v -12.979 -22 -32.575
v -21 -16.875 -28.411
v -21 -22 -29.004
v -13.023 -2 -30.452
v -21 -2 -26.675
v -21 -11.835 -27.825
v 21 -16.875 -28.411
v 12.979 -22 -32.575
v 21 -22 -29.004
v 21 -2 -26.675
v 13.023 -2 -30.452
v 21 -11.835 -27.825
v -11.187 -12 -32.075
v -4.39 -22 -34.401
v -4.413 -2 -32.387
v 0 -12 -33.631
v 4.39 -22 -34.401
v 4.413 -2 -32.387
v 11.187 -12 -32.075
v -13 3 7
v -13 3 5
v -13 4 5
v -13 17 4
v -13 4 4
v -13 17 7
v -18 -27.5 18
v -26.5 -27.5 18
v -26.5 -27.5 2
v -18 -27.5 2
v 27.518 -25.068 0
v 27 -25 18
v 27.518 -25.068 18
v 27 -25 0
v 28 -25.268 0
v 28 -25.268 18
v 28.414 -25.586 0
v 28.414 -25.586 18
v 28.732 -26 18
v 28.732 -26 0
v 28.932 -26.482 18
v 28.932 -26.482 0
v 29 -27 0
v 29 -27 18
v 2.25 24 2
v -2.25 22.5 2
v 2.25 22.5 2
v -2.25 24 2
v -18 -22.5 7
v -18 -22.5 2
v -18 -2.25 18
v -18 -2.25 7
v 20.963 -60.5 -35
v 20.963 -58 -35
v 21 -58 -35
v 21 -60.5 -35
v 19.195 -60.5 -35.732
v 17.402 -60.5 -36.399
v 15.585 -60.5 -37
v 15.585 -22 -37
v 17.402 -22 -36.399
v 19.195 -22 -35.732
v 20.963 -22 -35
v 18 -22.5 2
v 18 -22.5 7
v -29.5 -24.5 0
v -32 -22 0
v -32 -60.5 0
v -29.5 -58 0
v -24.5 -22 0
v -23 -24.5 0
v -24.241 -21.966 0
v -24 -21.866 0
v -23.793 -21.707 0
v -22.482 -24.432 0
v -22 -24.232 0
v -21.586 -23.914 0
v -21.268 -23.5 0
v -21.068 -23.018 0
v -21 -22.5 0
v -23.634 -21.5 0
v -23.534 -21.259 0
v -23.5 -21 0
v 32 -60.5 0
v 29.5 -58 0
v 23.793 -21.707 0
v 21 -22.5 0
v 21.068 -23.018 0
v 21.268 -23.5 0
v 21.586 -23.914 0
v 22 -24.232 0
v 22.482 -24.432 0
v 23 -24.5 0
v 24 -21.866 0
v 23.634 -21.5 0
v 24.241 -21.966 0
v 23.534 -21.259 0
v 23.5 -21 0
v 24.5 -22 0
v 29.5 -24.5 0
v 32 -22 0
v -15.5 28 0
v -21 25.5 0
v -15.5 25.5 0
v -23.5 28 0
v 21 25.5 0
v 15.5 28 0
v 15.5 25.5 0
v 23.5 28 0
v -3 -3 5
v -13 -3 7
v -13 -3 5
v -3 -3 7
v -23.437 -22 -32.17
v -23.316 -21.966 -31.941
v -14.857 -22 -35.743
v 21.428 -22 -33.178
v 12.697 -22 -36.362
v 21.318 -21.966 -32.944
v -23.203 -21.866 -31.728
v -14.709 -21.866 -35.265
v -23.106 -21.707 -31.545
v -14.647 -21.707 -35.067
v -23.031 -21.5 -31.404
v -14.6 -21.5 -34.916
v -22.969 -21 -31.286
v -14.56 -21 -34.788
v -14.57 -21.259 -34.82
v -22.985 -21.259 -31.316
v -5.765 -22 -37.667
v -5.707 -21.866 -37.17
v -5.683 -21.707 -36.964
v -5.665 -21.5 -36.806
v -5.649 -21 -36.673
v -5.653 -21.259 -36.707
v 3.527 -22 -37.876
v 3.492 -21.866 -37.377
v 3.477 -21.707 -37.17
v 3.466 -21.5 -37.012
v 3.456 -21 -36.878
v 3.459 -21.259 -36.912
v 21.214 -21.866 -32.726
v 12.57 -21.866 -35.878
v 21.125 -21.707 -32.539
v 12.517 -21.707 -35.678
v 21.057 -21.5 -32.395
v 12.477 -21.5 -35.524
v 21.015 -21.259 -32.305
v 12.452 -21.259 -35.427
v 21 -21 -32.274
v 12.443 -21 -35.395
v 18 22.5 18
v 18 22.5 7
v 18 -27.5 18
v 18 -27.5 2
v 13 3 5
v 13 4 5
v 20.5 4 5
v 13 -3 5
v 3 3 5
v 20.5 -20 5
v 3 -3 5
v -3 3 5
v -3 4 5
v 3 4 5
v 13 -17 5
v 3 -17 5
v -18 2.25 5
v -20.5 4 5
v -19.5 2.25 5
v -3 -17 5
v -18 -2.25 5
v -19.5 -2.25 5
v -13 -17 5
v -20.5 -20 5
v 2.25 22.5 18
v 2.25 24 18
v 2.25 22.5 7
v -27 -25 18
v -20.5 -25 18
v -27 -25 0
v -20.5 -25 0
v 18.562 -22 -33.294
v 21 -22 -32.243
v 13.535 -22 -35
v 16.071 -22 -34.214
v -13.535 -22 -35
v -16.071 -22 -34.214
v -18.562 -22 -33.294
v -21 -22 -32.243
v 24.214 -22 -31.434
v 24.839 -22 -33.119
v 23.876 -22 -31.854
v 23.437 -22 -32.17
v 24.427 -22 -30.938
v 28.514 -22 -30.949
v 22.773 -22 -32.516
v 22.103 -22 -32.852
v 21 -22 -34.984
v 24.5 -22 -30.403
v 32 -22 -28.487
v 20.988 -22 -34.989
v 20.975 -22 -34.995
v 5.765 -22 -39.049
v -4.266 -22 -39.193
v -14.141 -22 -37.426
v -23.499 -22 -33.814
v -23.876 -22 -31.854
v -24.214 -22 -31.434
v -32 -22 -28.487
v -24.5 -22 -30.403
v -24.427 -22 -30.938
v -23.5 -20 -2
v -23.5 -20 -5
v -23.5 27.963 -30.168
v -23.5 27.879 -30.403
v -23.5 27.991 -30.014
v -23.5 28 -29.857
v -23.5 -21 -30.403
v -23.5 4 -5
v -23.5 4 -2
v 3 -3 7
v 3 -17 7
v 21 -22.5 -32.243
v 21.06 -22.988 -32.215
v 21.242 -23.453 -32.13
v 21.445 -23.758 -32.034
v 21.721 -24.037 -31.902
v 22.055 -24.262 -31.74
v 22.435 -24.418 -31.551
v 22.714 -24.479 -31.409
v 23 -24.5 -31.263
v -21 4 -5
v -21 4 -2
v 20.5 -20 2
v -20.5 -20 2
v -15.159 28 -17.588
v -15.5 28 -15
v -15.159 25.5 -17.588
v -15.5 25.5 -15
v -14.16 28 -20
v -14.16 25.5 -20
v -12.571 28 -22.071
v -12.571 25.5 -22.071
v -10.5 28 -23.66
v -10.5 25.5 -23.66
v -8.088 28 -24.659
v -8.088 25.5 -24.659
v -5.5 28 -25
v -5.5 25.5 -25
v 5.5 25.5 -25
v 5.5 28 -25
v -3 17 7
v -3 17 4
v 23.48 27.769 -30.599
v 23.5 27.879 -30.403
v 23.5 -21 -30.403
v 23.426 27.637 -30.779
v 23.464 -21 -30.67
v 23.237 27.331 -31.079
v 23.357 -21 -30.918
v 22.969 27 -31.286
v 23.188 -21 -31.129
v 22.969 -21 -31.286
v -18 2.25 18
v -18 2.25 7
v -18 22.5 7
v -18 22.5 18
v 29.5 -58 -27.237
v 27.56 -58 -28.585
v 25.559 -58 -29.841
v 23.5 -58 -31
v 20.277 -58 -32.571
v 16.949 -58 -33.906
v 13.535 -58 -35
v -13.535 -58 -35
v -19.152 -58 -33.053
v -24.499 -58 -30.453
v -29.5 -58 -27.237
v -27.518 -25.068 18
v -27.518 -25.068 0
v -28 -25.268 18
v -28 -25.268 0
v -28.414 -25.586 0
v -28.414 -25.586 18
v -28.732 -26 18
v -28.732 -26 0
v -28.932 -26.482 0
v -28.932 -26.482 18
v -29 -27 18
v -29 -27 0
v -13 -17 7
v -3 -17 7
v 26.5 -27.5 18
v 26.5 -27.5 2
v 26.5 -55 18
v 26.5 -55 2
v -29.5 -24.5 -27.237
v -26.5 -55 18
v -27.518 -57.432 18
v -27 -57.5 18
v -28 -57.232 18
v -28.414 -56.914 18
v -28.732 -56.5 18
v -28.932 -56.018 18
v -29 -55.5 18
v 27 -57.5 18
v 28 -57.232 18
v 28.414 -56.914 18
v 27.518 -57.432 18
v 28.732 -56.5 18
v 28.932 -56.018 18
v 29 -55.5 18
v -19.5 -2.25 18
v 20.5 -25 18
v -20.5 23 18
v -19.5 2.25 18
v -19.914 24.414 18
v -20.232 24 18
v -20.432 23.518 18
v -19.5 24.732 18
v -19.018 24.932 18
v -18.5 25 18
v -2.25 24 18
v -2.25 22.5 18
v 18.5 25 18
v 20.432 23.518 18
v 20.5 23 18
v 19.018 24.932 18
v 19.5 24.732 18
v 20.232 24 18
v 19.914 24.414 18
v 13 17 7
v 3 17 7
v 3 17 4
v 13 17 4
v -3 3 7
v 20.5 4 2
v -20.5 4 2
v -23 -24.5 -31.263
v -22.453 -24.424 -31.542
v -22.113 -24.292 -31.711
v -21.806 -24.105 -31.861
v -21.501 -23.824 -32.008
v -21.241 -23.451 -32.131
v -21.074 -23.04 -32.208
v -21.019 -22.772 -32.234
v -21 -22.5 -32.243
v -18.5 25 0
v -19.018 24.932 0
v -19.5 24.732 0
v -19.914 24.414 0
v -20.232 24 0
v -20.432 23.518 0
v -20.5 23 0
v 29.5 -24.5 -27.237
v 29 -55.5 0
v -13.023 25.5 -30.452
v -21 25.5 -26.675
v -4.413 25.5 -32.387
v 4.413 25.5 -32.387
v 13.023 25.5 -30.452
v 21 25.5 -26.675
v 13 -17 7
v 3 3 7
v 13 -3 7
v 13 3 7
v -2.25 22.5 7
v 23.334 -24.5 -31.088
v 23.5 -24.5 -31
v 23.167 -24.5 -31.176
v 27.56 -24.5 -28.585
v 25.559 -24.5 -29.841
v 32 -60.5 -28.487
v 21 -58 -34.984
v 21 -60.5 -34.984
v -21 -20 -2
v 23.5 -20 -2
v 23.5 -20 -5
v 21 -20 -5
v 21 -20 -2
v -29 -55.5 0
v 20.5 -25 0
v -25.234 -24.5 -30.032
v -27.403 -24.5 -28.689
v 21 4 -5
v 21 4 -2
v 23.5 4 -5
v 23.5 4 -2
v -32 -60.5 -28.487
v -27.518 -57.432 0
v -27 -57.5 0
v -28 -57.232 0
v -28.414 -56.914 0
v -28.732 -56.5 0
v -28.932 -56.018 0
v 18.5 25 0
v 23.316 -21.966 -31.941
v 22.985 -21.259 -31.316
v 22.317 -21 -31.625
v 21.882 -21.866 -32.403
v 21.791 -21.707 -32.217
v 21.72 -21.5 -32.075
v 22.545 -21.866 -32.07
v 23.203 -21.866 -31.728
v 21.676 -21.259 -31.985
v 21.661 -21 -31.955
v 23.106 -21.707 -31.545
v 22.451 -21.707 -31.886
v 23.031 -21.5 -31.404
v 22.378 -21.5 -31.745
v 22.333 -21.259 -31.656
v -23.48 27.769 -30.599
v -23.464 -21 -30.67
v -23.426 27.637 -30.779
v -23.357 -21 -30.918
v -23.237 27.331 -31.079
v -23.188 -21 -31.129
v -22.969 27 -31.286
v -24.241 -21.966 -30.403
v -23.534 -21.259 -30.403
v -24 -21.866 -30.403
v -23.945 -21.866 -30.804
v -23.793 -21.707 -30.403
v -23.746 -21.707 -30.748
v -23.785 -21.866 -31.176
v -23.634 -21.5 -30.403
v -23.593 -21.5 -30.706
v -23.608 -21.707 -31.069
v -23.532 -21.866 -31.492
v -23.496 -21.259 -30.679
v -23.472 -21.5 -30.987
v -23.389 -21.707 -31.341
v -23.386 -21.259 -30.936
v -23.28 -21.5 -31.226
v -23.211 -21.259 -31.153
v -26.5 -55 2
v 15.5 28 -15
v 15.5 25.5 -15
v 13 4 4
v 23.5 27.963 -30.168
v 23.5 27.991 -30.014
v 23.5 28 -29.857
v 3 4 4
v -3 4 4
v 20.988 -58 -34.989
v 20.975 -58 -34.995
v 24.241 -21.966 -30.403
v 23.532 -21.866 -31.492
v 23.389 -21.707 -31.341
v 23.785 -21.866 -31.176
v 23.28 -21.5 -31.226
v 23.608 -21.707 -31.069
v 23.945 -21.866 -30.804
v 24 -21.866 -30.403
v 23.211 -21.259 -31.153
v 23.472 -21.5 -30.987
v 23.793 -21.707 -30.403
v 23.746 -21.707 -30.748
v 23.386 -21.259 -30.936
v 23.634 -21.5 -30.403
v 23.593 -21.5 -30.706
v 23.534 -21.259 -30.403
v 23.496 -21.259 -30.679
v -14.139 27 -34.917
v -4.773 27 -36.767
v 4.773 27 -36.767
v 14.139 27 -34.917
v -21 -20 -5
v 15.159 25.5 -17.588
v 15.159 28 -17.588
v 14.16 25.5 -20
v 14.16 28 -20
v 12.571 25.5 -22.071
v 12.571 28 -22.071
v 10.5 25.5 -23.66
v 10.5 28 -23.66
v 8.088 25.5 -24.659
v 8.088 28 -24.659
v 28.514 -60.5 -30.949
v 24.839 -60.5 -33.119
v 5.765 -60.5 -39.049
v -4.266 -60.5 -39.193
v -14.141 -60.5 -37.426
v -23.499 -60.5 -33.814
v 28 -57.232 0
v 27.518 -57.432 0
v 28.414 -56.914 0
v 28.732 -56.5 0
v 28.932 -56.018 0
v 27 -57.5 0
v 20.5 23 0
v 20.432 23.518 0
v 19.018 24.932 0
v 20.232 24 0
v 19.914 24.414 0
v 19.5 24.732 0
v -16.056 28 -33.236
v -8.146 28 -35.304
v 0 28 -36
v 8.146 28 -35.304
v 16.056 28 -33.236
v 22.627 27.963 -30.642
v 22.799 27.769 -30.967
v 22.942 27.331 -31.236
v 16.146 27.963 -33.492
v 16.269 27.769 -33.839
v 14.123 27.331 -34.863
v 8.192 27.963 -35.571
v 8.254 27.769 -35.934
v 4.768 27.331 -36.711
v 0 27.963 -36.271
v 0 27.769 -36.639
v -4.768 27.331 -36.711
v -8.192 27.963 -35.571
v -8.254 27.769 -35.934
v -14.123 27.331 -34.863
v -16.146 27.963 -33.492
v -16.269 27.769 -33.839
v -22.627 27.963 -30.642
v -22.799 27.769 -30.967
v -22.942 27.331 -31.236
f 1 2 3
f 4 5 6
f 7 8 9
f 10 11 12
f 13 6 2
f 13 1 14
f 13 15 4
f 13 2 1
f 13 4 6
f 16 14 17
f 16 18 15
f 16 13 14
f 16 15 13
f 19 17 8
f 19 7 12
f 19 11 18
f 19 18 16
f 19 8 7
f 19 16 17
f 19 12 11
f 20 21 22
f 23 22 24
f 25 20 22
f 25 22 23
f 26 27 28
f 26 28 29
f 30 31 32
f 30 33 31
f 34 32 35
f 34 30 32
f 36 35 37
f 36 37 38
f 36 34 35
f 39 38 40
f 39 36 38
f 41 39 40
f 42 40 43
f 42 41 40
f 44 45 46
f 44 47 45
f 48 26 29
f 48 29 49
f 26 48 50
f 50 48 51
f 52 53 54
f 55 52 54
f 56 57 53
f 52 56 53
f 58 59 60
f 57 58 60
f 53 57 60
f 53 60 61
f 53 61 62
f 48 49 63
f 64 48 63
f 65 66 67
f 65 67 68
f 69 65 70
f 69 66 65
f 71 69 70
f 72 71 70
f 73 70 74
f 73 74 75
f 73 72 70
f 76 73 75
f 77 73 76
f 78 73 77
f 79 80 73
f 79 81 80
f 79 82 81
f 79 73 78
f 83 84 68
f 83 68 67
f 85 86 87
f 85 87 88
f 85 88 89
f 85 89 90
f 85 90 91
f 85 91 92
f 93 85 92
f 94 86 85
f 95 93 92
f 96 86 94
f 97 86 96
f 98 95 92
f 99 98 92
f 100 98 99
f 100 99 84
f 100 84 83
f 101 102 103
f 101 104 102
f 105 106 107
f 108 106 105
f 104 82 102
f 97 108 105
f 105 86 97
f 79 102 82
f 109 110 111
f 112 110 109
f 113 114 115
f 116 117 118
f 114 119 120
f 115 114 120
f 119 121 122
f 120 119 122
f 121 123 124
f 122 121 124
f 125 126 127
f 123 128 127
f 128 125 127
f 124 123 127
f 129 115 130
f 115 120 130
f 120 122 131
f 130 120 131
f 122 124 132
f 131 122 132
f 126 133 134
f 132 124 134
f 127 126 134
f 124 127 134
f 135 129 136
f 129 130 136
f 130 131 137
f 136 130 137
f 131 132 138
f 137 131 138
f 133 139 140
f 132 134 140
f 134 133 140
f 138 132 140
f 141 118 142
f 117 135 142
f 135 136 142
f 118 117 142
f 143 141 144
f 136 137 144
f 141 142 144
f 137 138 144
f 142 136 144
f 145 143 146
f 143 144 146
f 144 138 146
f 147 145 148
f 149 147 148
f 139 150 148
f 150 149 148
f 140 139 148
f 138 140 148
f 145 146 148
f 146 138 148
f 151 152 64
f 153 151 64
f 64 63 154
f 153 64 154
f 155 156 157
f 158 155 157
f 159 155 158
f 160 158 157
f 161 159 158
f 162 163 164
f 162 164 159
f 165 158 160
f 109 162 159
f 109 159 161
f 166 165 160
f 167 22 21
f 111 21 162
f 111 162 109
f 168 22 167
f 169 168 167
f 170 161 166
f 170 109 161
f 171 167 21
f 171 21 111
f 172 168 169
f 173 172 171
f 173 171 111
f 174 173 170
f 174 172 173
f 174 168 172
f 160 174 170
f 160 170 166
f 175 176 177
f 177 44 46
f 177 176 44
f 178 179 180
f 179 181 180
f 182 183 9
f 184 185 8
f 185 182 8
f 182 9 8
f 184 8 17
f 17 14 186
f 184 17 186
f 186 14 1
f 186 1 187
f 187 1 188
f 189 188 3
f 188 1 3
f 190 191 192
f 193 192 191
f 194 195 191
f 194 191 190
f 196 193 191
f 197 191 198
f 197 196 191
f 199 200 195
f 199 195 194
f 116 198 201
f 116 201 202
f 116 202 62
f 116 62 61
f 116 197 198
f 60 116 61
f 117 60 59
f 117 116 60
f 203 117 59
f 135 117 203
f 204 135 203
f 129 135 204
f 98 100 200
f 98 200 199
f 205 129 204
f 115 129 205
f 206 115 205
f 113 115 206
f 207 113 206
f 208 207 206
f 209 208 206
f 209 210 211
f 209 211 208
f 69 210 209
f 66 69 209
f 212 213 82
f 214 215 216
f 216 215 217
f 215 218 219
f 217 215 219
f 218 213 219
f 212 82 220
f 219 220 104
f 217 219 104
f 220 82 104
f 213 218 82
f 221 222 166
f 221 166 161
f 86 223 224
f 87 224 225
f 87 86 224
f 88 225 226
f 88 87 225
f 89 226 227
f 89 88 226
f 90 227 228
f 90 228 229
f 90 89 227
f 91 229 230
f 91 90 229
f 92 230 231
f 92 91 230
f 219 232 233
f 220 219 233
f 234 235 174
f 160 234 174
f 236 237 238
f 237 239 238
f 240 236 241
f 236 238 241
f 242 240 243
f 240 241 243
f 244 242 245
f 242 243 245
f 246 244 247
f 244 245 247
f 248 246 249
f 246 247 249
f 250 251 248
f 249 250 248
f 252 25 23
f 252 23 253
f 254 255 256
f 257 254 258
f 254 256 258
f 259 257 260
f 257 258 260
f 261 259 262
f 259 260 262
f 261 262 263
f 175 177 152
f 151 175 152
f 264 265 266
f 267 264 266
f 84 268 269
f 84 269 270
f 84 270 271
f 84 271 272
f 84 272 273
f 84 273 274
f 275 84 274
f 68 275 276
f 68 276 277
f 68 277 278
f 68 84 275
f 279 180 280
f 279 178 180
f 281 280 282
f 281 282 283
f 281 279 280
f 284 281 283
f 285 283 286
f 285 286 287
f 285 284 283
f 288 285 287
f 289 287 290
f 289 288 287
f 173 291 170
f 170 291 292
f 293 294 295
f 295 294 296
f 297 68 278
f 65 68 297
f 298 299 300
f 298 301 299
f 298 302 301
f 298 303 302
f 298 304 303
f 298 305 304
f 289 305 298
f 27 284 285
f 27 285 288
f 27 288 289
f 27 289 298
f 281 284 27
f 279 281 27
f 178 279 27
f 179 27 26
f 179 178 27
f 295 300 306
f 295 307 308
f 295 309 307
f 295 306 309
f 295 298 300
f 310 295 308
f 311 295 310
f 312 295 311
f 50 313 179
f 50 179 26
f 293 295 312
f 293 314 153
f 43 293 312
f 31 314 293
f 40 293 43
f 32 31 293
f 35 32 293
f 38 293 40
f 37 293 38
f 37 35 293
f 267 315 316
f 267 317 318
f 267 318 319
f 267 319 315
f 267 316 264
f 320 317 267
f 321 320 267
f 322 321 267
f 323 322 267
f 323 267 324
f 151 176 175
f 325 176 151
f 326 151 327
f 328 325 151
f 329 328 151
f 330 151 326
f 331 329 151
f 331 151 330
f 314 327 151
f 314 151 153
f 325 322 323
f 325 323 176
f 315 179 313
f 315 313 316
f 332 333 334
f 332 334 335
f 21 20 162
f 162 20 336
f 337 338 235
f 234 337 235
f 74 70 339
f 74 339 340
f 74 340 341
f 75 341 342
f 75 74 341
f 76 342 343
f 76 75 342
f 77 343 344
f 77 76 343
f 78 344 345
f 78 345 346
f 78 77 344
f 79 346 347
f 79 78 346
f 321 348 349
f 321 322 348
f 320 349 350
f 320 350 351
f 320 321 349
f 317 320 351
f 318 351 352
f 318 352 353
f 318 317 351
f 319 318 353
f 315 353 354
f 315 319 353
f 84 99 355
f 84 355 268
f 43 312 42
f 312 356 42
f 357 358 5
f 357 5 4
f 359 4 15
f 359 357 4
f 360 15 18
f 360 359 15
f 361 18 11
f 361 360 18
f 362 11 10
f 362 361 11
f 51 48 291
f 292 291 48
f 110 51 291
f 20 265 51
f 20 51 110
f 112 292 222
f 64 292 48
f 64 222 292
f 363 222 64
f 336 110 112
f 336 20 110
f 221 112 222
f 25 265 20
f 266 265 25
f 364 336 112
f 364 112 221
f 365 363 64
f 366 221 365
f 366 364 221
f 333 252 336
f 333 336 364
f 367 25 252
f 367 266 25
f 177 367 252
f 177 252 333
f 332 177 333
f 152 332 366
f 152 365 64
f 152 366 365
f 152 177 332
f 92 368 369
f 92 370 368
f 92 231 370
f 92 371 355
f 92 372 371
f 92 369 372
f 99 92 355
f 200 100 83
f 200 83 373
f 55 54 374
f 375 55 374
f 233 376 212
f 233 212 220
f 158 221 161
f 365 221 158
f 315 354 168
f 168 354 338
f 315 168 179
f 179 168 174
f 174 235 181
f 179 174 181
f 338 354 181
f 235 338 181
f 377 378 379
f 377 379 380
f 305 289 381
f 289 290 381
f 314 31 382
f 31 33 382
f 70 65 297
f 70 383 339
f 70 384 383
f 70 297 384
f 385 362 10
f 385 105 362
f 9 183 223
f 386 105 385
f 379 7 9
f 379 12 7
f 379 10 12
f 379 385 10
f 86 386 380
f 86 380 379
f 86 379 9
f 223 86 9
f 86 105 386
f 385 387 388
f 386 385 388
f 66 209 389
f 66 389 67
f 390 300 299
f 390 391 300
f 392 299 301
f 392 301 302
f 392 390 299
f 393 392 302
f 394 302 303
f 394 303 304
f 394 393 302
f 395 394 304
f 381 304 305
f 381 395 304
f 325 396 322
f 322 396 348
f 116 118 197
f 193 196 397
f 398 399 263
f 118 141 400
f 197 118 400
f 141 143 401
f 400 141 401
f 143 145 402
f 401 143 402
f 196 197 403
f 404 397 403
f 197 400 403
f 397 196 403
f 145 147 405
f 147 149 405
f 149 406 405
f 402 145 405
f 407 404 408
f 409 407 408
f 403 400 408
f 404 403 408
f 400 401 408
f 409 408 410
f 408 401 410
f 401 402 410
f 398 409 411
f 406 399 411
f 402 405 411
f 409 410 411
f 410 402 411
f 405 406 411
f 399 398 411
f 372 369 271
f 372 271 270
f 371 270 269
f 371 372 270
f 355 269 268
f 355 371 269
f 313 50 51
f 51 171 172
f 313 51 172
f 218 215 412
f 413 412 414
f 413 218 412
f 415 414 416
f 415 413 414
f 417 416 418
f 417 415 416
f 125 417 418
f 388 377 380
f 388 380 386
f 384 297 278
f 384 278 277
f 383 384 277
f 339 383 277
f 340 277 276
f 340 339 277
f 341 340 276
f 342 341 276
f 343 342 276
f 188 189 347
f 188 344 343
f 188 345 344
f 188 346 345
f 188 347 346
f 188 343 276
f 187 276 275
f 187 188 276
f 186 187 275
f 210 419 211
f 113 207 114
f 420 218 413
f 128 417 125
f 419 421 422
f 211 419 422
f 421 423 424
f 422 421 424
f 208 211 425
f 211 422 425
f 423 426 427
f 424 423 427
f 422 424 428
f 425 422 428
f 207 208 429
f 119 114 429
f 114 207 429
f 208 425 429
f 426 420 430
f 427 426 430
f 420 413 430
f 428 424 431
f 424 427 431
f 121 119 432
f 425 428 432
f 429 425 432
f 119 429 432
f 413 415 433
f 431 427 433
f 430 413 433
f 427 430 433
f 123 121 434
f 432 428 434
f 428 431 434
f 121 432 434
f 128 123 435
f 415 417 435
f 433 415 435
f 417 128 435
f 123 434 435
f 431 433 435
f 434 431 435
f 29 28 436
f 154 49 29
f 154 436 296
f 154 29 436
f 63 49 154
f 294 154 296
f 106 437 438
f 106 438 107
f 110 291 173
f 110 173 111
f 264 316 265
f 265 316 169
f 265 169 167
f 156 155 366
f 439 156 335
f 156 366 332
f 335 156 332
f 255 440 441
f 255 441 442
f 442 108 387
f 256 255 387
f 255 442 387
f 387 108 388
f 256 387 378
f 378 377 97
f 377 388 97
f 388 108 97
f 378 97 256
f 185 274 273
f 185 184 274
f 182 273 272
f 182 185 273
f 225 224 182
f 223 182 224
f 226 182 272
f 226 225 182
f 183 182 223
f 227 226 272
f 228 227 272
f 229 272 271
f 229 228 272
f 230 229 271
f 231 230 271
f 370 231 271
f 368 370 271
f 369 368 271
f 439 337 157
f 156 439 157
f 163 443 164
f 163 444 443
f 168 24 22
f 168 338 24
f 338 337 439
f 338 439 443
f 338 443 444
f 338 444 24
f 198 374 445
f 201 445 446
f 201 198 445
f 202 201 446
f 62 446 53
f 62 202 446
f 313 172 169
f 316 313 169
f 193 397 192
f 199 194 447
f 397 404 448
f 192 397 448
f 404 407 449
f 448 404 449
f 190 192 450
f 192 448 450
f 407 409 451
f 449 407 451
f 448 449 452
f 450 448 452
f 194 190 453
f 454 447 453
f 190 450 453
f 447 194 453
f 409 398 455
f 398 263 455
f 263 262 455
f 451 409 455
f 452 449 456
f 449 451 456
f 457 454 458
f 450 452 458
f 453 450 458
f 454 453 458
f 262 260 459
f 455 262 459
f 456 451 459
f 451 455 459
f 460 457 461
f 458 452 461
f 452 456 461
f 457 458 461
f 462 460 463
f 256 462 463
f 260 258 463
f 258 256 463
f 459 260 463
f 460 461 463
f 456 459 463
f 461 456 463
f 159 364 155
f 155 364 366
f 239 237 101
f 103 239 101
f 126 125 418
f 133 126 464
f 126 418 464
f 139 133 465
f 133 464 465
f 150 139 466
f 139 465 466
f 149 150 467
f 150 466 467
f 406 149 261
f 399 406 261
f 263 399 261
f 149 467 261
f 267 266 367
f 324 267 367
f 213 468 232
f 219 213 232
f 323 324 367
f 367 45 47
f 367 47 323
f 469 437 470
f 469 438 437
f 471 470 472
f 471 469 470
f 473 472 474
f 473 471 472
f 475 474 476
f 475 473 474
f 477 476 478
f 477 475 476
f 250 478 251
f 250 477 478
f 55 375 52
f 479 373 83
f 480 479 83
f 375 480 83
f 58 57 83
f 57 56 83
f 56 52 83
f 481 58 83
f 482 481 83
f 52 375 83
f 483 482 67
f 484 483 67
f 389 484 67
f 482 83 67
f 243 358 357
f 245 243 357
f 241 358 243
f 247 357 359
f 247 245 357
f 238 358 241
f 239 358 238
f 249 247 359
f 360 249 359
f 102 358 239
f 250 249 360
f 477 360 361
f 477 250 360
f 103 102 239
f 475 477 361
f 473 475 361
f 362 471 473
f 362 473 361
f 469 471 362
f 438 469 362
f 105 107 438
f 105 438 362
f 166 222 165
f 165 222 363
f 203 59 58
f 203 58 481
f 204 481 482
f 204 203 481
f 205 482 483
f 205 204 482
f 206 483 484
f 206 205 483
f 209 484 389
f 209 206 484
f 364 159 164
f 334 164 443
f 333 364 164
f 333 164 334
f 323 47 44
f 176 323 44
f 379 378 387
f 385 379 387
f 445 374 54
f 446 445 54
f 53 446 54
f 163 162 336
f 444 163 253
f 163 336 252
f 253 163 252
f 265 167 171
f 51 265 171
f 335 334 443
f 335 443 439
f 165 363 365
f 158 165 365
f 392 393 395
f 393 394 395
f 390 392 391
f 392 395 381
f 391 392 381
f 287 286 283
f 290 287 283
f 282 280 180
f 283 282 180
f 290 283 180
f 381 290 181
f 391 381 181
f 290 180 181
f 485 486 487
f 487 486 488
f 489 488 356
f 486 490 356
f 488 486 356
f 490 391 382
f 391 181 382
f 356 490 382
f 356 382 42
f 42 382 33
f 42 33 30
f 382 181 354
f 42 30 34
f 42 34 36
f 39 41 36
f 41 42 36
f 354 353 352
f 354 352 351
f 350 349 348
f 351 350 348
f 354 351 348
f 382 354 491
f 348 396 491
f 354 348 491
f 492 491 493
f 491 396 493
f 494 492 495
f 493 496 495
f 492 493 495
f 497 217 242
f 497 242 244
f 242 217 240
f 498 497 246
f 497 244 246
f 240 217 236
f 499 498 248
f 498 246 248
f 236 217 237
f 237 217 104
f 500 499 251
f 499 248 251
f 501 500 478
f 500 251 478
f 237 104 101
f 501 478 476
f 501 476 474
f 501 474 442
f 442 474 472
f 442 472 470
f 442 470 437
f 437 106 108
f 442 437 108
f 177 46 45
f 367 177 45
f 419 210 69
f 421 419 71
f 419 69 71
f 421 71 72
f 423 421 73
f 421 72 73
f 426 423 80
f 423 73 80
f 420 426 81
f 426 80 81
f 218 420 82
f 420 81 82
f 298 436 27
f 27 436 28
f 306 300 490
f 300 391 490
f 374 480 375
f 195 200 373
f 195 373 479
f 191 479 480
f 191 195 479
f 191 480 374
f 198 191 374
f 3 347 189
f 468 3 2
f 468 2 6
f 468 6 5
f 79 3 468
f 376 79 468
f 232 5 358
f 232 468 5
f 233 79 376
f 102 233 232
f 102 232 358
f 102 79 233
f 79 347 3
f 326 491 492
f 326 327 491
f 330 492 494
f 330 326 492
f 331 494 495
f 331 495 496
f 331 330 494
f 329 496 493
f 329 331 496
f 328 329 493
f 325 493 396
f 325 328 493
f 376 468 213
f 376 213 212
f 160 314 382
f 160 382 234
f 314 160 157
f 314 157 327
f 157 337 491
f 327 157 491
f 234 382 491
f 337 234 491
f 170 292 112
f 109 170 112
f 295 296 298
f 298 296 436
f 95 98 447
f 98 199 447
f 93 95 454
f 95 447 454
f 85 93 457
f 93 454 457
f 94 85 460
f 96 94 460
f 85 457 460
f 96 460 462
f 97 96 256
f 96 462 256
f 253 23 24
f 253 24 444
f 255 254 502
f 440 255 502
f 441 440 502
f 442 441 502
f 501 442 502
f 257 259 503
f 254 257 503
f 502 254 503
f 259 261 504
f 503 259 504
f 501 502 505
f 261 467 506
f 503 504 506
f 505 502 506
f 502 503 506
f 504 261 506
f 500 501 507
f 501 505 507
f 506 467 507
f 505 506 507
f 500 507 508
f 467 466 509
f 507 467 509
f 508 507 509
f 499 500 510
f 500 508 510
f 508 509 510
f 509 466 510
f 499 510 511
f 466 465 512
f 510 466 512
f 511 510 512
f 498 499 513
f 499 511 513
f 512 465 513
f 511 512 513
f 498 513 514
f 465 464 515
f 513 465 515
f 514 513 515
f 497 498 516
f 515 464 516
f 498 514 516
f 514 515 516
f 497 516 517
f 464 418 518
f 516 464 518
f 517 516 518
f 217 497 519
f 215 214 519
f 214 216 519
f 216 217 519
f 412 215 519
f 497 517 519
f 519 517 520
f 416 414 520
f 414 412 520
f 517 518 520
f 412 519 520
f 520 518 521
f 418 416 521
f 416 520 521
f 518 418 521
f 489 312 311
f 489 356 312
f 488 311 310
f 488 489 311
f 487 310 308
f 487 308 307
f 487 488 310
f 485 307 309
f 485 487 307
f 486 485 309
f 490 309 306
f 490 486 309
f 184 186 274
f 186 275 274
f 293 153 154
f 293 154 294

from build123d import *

# Parameters (mm, degrees)
F1_DEPTH  = 2
F2_DEPTH  = 18
F4_DEPTH  = 5
F5_W      = 24
F5_H      = 3
F6_DEPTH  = 41
F7_W      = 10
F7_H      = 14
F8_DEPTH  = 3
F9_DEPTH  = 35
F11_DEPTH = 2
F12_R     = 2
F13_W     = 31
F13_H     = 25
F14_DEPTH = 2.5
F15_R     = 10
F17_DEPTH = 50
F18_DEPTH = 50
F20_DEPTH = 38.5
F21_DEPTH = 38.5
F22_R     = 1
F23_W     = 24
F23_H     = 3
F24_DEPTH = 47
F25_SIZE2 = 20
F25_SIZE  = 2


with BuildPart() as f1:
    # F0 (on Top) → F1 (new body)
    with BuildSketch(Plane.XY):
        Polygon((20.5, -25), (20.5, 25), (-20.5, 25), (-20.5, -25), (-29, -25), (-29, -57.5), (29, -57.5), (29, -25), align=None)
        Polygon((2.25, 22.5), (18, 22.5), (18, -27.5), (26.5, -27.5), (26.5, -55), (-26.5, -55), (-26.5, -27.5), (-18, -27.5), (-18, -2.25), (-19.5, -2.25), (-19.5, 2.25), (-18, 2.25), (-18, 22.5), (-2.25, 22.5), (-2.25, 24), (2.25, 24), align=None, mode=Mode.SUBTRACT)
        Polygon((18, -27.5), (18, 22.5), (2.25, 22.5), (2.25, 24), (-2.25, 24), (-2.25, 22.5), (-18, 22.5), (-18, 2.25), (-19.5, 2.25), (-19.5, -2.25), (-18, -2.25), (-18, -27.5), (-26.5, -27.5), (-26.5, -55), (26.5, -55), (26.5, -27.5), align=None)
    extrude(amount=F1_DEPTH)

    # F0 (on Top) → F2 (join)
    with BuildSketch(Plane.XY):
        Polygon((20.5, -25), (20.5, 25), (-20.5, 25), (-20.5, -25), (-29, -25), (-29, -57.5), (29, -57.5), (29, -25), align=None)
        Polygon((2.25, 22.5), (18, 22.5), (18, -27.5), (26.5, -27.5), (26.5, -55), (-26.5, -55), (-26.5, -27.5), (-18, -27.5), (-18, -2.25), (-19.5, -2.25), (-19.5, 2.25), (-18, 2.25), (-18, 22.5), (-2.25, 22.5), (-2.25, 24), (2.25, 24), align=None, mode=Mode.SUBTRACT)
    extrude(amount=F2_DEPTH)

    # F3 (on face) → F4 (join)
    with BuildSketch(Plane.XY.offset(2)):
        Polygon((18, -22.5), (18, 22.5), (2.25, 22.5), (-2.25, 22.5), (-18, 22.5), (-18, 2.25), (-18, -2.25), (-18, -22.5), align=None)
    extrude(amount=F4_DEPTH)

    # F5 (on face) → F6 (cut, through all)
    with BuildSketch(Plane(origin=(-20.5, 0, 0), x_dir=(0, -1, 0), z_dir=(-1, 0, 0))):
        with Locations((8, 3.5)):
            Rectangle(F5_W, F5_H)
    extrude(amount=-F6_DEPTH, mode=Mode.SUBTRACT)

    # F7 (on face) → F8 (cut)
    with BuildSketch(Plane.XY.offset(7)):
        with Locations((-8, 10)):
            Rectangle(F7_W, F7_H)
        with Locations((8, 10)):
            Rectangle(F7_W, F7_H)
        with Locations((-8, -10)):
            Rectangle(F7_W, F7_H)
        with Locations((8, -10)):
            Rectangle(F7_W, F7_H)
    extrude(amount=-F8_DEPTH, mode=Mode.SUBTRACT)

    # F12
    f12_edges = [f1.edges().sort_by_distance(p)[0] for p in [
        (-29, -57.5, 9),
        (-29, -25, 9),
        (29, -57.5, 9),
        (-20.5, 25, 9),
        (29, -25, 9),
        (20.5, 25, 9),
    ]]
    fillet(f12_edges, radius=F12_R)


with BuildPart() as f9:
    # F0 (on Top) → F9 (new body)
    with BuildSketch(Plane.XY):
        Polygon((-23.5, -22), (-32, -22), (-32, -60.5), (32, -60.5), (32, -22), (23.5, -22), (23.5, 28), (-23.5, 28), align=None)
        with BuildLine():
            Line((-29.5, -58), (-29.5, -24.5))
            Line((-29.5, -24.5), (-23, -24.5))
            ThreePointArc((-23, -24.5), (-21.5857864376, -23.9142135624), (-21, -22.5))
            Line((-21, -22.5), (-21, 25.5))
            Line((-21, 25.5), (21, 25.5))
            Line((21, 25.5), (21, -22.5))
            ThreePointArc((21, -22.5), (21.5857864376, -23.9142135624), (23, -24.5))
            Line((23, -24.5), (29.5, -24.5))
            Line((29.5, -24.5), (29.5, -58))
            Line((29.5, -58), (-29.5, -58))
        make_face(mode=Mode.SUBTRACT)
    extrude(amount=-F9_DEPTH)

    # F10 (on face) → F11 (join)
    with BuildSketch(Plane(origin=(0, 0, -35), x_dir=(1, 0, 0), z_dir=(0, 0, -1))):
        Polygon((32, 60.5), (-32, 60.5), (-32, 22), (-23.5, 22), (-23.5, -28), (23.5, -28), (23.5, 22), (32, 22), align=None)
    extrude(amount=F11_DEPTH)

    # F13 (on face) → F14 (cut, through all)
    with BuildSketch(Plane(origin=(0, 28, 0), x_dir=(-1, 0, 0), z_dir=(0, 1, 0))):
        with Locations((0, -12.5)):
            Rectangle(F13_W, F13_H)
    extrude(amount=-F14_DEPTH, mode=Mode.SUBTRACT)

    # F15
    f15_edges = [f9.edges().sort_by_distance(p)[0] for p in [
        (15.5, 26.75, -25),
        (-15.5, 26.75, -25),
    ]]
    fillet(f15_edges, radius=F15_R)

    # F16 (on face) → F17 (cut, through all)
    with BuildSketch(Plane(origin=(0, 28, 0), x_dir=(-1, 0, 0), z_dir=(0, 1, 0))):
        with BuildLine():
            Line((23.5, -37), (1.547e-07, -37))
            Line((1.547e-07, -37), (-23.5, -37))
            Line((-23.5, -37), (-23.5, -37.7059200294))
            ThreePointArc((-23.5, -37.7059200294), (0, -42.9791666667), (23.5, -37.7059200294))
            Line((23.5, -37.7059200294), (23.5, -37))
        make_face()
        with BuildLine():
            ThreePointArc((1.547e-07, -37), (-12.1269327607, -35.476320292), (-23.5, -31))
            Line((-23.5, -31), (-23.5, -37))
            Line((-23.5, -37), (1.547e-07, -37))
        make_face()
        with BuildLine():
            Line((23.5, -37), (23.5, -31))
            ThreePointArc((23.5, -31), (12.1269329106, -35.4763202538), (1.547e-07, -37))
            Line((1.547e-07, -37), (23.5, -37))
        make_face()
    extrude(amount=-F17_DEPTH, mode=Mode.SUBTRACT)

    # F16 (on face) → F18 (join, through all)
    with BuildSketch(Plane(origin=(0, 28, 0), x_dir=(-1, 0, 0), z_dir=(0, 1, 0))):
        with BuildLine():
            ThreePointArc((23.5, -25), (0, -32.6310333807), (-23.5, -25))
            Line((-23.5, -25), (-23.5, -31))
            ThreePointArc((-23.5, -31), (-12.1269327607, -35.476320292), (1.547e-07, -37))
            ThreePointArc((1.547e-07, -37), (12.1269329106, -35.4763202538), (23.5, -31))
            Line((23.5, -31), (23.5, -25))
        make_face()
    extrude(amount=-F18_DEPTH)

    # F19 (on face) → F20 (cut, through all)
    with BuildSketch(Plane(origin=(0, -22, 0), x_dir=(-1, 0, 0), z_dir=(0, 1, 0))):
        with BuildLine():
            ThreePointArc((-21, -34.9837240518), (-26.6983501126, -32.0711934239), (-32, -28.4869867981))
            Line((-32, -28.4869867981), (-32, -37))
            Line((-32, -37), (-15.5852542827, -37))
            ThreePointArc((-15.5852542827, -37), (-18.3013018384, -36.073511616), (-20.962667627, -35))
            Line((-20.962667627, -35), (-21, -35))
            Line((-21, -35), (-21, -34.9837240518))
        make_face()
        with BuildLine():
            Line((-15.5852542827, -37), (-32, -37))
            Line((-32, -37), (-32, -37.6209894166))
            ThreePointArc((-32, -37.6209894166), (0, -46.8666792548), (32, -37.6209894166))
            Line((32, -37.6209894166), (32, -28.4869867981))
            ThreePointArc((32, -28.4869867981), (9.2454755251, -38.5461837253), (-15.5852542827, -37))
        make_face()
        with BuildLine():
            ThreePointArc((-23.5, -31), (-27.8967129385, -28.3609367759), (-32, -25.2854246794))
            Line((-32, -25.2854246794), (-32, -28.4869867981))
            ThreePointArc((-32, -28.4869867981), (-26.6983501126, -32.0711934239), (-21, -34.9837240518))
            Line((-21, -34.9837240518), (-21, -32.2741110813))
            ThreePointArc((-21, -32.2741110813), (-22.2591181263, -31.6549466933), (-23.5, -31))
        make_face()
        with BuildLine():
            ThreePointArc((32, -25.2854246794), (5.1211905621, -36.6037218611), (-23.5, -31))
            ThreePointArc((-23.5, -31), (-22.2591181263, -31.6549466933), (-21, -32.2741110813))
            Line((-21, -32.2741110813), (-21, -34.9837240518))
            ThreePointArc((-21, -34.9837240518), (-20.9813353917, -34.9918656459), (-20.962667627, -35))
            Line((-20.962667627, -35), (-13.859413167, -35))
            ThreePointArc((-13.859413167, -35), (-7.0014879371, -36.4974237186), (0, -37))
            Line((0, -37), (-15.5852542827, -37))
            ThreePointArc((-15.5852542827, -37), (9.2454755251, -38.5461837253), (32, -28.4869867981))
            Line((32, -28.4869867981), (32, -25.2854246794))
        make_face()
    extrude(amount=-F20_DEPTH, mode=Mode.SUBTRACT)

    # F19 (on face) → F21 (join, through all)
    with BuildSketch(Plane(origin=(0, -22, 0), x_dir=(-1, 0, 0), z_dir=(0, 1, 0))):
        with BuildLine():
            ThreePointArc((-23.5, -31), (-27.8967129385, -28.3609367759), (-32, -25.2854246794))
            Line((-32, -25.2854246794), (-32, -28.4869867981))
            ThreePointArc((-32, -28.4869867981), (-26.6983501126, -32.0711934239), (-21, -34.9837240518))
            Line((-21, -34.9837240518), (-21, -32.2741110813))
            ThreePointArc((-21, -32.2741110813), (-22.2591181263, -31.6549466933), (-23.5, -31))
        make_face()
        with BuildLine():
            Line((-13.859413167, -35), (-20.962667627, -35))
            ThreePointArc((-20.962667627, -35), (-18.3013018384, -36.073511616), (-15.5852542827, -37))
            Line((-15.5852542827, -37), (0, -37))
            ThreePointArc((0, -37), (-7.0014879371, -36.4974237186), (-13.859413167, -35))
        make_face()
        with BuildLine():
            ThreePointArc((32, -25.2854246794), (5.1211905621, -36.6037218611), (-23.5, -31))
            ThreePointArc((-23.5, -31), (-22.2591181263, -31.6549466933), (-21, -32.2741110813))
            Line((-21, -32.2741110813), (-21, -34.9837240518))
            ThreePointArc((-21, -34.9837240518), (-20.9813353917, -34.9918656459), (-20.962667627, -35))
            Line((-20.962667627, -35), (-13.859413167, -35))
            ThreePointArc((-13.859413167, -35), (-7.0014879371, -36.4974237186), (0, -37))
            Line((0, -37), (-15.5852542827, -37))
            ThreePointArc((-15.5852542827, -37), (9.2454755251, -38.5461837253), (32, -28.4869867981))
            Line((32, -28.4869867981), (32, -25.2854246794))
        make_face()
    extrude(amount=-F21_DEPTH)

    # F22
    f22_edges = [f9.edges().sort_by_distance(p)[0] for p in [
        (0, 28, -37),
        (23.5, 3, -31),
        (0, -22, -37),
        (-23.5, 3, -31),
        (-23.5, -22, -15.5),
        (23.5, -22, -15.5),
    ]]
    fillet(f22_edges, radius=F22_R)

    # F23 (on face) → F24 (cut, through all)
    with BuildSketch(Plane.YZ.offset(23.5)):
        with Locations((-8, -3.5)):
            Rectangle(F23_W, F23_H)
    extrude(amount=-F24_DEPTH, mode=Mode.SUBTRACT)

    # F25
    f25_edges = [f9.edges().sort_by_distance(p)[0] for p in [
        (0, -22, -32.631033),
    ]]
    f25_side = f9.faces().sort_by_distance((20.571829, -22, -29.459003))[0]
    chamfer(f25_edges, length=F25_SIZE, length2=F25_SIZE2, reference=f25_side)


solid = Compound([f1.part, f9.part])
